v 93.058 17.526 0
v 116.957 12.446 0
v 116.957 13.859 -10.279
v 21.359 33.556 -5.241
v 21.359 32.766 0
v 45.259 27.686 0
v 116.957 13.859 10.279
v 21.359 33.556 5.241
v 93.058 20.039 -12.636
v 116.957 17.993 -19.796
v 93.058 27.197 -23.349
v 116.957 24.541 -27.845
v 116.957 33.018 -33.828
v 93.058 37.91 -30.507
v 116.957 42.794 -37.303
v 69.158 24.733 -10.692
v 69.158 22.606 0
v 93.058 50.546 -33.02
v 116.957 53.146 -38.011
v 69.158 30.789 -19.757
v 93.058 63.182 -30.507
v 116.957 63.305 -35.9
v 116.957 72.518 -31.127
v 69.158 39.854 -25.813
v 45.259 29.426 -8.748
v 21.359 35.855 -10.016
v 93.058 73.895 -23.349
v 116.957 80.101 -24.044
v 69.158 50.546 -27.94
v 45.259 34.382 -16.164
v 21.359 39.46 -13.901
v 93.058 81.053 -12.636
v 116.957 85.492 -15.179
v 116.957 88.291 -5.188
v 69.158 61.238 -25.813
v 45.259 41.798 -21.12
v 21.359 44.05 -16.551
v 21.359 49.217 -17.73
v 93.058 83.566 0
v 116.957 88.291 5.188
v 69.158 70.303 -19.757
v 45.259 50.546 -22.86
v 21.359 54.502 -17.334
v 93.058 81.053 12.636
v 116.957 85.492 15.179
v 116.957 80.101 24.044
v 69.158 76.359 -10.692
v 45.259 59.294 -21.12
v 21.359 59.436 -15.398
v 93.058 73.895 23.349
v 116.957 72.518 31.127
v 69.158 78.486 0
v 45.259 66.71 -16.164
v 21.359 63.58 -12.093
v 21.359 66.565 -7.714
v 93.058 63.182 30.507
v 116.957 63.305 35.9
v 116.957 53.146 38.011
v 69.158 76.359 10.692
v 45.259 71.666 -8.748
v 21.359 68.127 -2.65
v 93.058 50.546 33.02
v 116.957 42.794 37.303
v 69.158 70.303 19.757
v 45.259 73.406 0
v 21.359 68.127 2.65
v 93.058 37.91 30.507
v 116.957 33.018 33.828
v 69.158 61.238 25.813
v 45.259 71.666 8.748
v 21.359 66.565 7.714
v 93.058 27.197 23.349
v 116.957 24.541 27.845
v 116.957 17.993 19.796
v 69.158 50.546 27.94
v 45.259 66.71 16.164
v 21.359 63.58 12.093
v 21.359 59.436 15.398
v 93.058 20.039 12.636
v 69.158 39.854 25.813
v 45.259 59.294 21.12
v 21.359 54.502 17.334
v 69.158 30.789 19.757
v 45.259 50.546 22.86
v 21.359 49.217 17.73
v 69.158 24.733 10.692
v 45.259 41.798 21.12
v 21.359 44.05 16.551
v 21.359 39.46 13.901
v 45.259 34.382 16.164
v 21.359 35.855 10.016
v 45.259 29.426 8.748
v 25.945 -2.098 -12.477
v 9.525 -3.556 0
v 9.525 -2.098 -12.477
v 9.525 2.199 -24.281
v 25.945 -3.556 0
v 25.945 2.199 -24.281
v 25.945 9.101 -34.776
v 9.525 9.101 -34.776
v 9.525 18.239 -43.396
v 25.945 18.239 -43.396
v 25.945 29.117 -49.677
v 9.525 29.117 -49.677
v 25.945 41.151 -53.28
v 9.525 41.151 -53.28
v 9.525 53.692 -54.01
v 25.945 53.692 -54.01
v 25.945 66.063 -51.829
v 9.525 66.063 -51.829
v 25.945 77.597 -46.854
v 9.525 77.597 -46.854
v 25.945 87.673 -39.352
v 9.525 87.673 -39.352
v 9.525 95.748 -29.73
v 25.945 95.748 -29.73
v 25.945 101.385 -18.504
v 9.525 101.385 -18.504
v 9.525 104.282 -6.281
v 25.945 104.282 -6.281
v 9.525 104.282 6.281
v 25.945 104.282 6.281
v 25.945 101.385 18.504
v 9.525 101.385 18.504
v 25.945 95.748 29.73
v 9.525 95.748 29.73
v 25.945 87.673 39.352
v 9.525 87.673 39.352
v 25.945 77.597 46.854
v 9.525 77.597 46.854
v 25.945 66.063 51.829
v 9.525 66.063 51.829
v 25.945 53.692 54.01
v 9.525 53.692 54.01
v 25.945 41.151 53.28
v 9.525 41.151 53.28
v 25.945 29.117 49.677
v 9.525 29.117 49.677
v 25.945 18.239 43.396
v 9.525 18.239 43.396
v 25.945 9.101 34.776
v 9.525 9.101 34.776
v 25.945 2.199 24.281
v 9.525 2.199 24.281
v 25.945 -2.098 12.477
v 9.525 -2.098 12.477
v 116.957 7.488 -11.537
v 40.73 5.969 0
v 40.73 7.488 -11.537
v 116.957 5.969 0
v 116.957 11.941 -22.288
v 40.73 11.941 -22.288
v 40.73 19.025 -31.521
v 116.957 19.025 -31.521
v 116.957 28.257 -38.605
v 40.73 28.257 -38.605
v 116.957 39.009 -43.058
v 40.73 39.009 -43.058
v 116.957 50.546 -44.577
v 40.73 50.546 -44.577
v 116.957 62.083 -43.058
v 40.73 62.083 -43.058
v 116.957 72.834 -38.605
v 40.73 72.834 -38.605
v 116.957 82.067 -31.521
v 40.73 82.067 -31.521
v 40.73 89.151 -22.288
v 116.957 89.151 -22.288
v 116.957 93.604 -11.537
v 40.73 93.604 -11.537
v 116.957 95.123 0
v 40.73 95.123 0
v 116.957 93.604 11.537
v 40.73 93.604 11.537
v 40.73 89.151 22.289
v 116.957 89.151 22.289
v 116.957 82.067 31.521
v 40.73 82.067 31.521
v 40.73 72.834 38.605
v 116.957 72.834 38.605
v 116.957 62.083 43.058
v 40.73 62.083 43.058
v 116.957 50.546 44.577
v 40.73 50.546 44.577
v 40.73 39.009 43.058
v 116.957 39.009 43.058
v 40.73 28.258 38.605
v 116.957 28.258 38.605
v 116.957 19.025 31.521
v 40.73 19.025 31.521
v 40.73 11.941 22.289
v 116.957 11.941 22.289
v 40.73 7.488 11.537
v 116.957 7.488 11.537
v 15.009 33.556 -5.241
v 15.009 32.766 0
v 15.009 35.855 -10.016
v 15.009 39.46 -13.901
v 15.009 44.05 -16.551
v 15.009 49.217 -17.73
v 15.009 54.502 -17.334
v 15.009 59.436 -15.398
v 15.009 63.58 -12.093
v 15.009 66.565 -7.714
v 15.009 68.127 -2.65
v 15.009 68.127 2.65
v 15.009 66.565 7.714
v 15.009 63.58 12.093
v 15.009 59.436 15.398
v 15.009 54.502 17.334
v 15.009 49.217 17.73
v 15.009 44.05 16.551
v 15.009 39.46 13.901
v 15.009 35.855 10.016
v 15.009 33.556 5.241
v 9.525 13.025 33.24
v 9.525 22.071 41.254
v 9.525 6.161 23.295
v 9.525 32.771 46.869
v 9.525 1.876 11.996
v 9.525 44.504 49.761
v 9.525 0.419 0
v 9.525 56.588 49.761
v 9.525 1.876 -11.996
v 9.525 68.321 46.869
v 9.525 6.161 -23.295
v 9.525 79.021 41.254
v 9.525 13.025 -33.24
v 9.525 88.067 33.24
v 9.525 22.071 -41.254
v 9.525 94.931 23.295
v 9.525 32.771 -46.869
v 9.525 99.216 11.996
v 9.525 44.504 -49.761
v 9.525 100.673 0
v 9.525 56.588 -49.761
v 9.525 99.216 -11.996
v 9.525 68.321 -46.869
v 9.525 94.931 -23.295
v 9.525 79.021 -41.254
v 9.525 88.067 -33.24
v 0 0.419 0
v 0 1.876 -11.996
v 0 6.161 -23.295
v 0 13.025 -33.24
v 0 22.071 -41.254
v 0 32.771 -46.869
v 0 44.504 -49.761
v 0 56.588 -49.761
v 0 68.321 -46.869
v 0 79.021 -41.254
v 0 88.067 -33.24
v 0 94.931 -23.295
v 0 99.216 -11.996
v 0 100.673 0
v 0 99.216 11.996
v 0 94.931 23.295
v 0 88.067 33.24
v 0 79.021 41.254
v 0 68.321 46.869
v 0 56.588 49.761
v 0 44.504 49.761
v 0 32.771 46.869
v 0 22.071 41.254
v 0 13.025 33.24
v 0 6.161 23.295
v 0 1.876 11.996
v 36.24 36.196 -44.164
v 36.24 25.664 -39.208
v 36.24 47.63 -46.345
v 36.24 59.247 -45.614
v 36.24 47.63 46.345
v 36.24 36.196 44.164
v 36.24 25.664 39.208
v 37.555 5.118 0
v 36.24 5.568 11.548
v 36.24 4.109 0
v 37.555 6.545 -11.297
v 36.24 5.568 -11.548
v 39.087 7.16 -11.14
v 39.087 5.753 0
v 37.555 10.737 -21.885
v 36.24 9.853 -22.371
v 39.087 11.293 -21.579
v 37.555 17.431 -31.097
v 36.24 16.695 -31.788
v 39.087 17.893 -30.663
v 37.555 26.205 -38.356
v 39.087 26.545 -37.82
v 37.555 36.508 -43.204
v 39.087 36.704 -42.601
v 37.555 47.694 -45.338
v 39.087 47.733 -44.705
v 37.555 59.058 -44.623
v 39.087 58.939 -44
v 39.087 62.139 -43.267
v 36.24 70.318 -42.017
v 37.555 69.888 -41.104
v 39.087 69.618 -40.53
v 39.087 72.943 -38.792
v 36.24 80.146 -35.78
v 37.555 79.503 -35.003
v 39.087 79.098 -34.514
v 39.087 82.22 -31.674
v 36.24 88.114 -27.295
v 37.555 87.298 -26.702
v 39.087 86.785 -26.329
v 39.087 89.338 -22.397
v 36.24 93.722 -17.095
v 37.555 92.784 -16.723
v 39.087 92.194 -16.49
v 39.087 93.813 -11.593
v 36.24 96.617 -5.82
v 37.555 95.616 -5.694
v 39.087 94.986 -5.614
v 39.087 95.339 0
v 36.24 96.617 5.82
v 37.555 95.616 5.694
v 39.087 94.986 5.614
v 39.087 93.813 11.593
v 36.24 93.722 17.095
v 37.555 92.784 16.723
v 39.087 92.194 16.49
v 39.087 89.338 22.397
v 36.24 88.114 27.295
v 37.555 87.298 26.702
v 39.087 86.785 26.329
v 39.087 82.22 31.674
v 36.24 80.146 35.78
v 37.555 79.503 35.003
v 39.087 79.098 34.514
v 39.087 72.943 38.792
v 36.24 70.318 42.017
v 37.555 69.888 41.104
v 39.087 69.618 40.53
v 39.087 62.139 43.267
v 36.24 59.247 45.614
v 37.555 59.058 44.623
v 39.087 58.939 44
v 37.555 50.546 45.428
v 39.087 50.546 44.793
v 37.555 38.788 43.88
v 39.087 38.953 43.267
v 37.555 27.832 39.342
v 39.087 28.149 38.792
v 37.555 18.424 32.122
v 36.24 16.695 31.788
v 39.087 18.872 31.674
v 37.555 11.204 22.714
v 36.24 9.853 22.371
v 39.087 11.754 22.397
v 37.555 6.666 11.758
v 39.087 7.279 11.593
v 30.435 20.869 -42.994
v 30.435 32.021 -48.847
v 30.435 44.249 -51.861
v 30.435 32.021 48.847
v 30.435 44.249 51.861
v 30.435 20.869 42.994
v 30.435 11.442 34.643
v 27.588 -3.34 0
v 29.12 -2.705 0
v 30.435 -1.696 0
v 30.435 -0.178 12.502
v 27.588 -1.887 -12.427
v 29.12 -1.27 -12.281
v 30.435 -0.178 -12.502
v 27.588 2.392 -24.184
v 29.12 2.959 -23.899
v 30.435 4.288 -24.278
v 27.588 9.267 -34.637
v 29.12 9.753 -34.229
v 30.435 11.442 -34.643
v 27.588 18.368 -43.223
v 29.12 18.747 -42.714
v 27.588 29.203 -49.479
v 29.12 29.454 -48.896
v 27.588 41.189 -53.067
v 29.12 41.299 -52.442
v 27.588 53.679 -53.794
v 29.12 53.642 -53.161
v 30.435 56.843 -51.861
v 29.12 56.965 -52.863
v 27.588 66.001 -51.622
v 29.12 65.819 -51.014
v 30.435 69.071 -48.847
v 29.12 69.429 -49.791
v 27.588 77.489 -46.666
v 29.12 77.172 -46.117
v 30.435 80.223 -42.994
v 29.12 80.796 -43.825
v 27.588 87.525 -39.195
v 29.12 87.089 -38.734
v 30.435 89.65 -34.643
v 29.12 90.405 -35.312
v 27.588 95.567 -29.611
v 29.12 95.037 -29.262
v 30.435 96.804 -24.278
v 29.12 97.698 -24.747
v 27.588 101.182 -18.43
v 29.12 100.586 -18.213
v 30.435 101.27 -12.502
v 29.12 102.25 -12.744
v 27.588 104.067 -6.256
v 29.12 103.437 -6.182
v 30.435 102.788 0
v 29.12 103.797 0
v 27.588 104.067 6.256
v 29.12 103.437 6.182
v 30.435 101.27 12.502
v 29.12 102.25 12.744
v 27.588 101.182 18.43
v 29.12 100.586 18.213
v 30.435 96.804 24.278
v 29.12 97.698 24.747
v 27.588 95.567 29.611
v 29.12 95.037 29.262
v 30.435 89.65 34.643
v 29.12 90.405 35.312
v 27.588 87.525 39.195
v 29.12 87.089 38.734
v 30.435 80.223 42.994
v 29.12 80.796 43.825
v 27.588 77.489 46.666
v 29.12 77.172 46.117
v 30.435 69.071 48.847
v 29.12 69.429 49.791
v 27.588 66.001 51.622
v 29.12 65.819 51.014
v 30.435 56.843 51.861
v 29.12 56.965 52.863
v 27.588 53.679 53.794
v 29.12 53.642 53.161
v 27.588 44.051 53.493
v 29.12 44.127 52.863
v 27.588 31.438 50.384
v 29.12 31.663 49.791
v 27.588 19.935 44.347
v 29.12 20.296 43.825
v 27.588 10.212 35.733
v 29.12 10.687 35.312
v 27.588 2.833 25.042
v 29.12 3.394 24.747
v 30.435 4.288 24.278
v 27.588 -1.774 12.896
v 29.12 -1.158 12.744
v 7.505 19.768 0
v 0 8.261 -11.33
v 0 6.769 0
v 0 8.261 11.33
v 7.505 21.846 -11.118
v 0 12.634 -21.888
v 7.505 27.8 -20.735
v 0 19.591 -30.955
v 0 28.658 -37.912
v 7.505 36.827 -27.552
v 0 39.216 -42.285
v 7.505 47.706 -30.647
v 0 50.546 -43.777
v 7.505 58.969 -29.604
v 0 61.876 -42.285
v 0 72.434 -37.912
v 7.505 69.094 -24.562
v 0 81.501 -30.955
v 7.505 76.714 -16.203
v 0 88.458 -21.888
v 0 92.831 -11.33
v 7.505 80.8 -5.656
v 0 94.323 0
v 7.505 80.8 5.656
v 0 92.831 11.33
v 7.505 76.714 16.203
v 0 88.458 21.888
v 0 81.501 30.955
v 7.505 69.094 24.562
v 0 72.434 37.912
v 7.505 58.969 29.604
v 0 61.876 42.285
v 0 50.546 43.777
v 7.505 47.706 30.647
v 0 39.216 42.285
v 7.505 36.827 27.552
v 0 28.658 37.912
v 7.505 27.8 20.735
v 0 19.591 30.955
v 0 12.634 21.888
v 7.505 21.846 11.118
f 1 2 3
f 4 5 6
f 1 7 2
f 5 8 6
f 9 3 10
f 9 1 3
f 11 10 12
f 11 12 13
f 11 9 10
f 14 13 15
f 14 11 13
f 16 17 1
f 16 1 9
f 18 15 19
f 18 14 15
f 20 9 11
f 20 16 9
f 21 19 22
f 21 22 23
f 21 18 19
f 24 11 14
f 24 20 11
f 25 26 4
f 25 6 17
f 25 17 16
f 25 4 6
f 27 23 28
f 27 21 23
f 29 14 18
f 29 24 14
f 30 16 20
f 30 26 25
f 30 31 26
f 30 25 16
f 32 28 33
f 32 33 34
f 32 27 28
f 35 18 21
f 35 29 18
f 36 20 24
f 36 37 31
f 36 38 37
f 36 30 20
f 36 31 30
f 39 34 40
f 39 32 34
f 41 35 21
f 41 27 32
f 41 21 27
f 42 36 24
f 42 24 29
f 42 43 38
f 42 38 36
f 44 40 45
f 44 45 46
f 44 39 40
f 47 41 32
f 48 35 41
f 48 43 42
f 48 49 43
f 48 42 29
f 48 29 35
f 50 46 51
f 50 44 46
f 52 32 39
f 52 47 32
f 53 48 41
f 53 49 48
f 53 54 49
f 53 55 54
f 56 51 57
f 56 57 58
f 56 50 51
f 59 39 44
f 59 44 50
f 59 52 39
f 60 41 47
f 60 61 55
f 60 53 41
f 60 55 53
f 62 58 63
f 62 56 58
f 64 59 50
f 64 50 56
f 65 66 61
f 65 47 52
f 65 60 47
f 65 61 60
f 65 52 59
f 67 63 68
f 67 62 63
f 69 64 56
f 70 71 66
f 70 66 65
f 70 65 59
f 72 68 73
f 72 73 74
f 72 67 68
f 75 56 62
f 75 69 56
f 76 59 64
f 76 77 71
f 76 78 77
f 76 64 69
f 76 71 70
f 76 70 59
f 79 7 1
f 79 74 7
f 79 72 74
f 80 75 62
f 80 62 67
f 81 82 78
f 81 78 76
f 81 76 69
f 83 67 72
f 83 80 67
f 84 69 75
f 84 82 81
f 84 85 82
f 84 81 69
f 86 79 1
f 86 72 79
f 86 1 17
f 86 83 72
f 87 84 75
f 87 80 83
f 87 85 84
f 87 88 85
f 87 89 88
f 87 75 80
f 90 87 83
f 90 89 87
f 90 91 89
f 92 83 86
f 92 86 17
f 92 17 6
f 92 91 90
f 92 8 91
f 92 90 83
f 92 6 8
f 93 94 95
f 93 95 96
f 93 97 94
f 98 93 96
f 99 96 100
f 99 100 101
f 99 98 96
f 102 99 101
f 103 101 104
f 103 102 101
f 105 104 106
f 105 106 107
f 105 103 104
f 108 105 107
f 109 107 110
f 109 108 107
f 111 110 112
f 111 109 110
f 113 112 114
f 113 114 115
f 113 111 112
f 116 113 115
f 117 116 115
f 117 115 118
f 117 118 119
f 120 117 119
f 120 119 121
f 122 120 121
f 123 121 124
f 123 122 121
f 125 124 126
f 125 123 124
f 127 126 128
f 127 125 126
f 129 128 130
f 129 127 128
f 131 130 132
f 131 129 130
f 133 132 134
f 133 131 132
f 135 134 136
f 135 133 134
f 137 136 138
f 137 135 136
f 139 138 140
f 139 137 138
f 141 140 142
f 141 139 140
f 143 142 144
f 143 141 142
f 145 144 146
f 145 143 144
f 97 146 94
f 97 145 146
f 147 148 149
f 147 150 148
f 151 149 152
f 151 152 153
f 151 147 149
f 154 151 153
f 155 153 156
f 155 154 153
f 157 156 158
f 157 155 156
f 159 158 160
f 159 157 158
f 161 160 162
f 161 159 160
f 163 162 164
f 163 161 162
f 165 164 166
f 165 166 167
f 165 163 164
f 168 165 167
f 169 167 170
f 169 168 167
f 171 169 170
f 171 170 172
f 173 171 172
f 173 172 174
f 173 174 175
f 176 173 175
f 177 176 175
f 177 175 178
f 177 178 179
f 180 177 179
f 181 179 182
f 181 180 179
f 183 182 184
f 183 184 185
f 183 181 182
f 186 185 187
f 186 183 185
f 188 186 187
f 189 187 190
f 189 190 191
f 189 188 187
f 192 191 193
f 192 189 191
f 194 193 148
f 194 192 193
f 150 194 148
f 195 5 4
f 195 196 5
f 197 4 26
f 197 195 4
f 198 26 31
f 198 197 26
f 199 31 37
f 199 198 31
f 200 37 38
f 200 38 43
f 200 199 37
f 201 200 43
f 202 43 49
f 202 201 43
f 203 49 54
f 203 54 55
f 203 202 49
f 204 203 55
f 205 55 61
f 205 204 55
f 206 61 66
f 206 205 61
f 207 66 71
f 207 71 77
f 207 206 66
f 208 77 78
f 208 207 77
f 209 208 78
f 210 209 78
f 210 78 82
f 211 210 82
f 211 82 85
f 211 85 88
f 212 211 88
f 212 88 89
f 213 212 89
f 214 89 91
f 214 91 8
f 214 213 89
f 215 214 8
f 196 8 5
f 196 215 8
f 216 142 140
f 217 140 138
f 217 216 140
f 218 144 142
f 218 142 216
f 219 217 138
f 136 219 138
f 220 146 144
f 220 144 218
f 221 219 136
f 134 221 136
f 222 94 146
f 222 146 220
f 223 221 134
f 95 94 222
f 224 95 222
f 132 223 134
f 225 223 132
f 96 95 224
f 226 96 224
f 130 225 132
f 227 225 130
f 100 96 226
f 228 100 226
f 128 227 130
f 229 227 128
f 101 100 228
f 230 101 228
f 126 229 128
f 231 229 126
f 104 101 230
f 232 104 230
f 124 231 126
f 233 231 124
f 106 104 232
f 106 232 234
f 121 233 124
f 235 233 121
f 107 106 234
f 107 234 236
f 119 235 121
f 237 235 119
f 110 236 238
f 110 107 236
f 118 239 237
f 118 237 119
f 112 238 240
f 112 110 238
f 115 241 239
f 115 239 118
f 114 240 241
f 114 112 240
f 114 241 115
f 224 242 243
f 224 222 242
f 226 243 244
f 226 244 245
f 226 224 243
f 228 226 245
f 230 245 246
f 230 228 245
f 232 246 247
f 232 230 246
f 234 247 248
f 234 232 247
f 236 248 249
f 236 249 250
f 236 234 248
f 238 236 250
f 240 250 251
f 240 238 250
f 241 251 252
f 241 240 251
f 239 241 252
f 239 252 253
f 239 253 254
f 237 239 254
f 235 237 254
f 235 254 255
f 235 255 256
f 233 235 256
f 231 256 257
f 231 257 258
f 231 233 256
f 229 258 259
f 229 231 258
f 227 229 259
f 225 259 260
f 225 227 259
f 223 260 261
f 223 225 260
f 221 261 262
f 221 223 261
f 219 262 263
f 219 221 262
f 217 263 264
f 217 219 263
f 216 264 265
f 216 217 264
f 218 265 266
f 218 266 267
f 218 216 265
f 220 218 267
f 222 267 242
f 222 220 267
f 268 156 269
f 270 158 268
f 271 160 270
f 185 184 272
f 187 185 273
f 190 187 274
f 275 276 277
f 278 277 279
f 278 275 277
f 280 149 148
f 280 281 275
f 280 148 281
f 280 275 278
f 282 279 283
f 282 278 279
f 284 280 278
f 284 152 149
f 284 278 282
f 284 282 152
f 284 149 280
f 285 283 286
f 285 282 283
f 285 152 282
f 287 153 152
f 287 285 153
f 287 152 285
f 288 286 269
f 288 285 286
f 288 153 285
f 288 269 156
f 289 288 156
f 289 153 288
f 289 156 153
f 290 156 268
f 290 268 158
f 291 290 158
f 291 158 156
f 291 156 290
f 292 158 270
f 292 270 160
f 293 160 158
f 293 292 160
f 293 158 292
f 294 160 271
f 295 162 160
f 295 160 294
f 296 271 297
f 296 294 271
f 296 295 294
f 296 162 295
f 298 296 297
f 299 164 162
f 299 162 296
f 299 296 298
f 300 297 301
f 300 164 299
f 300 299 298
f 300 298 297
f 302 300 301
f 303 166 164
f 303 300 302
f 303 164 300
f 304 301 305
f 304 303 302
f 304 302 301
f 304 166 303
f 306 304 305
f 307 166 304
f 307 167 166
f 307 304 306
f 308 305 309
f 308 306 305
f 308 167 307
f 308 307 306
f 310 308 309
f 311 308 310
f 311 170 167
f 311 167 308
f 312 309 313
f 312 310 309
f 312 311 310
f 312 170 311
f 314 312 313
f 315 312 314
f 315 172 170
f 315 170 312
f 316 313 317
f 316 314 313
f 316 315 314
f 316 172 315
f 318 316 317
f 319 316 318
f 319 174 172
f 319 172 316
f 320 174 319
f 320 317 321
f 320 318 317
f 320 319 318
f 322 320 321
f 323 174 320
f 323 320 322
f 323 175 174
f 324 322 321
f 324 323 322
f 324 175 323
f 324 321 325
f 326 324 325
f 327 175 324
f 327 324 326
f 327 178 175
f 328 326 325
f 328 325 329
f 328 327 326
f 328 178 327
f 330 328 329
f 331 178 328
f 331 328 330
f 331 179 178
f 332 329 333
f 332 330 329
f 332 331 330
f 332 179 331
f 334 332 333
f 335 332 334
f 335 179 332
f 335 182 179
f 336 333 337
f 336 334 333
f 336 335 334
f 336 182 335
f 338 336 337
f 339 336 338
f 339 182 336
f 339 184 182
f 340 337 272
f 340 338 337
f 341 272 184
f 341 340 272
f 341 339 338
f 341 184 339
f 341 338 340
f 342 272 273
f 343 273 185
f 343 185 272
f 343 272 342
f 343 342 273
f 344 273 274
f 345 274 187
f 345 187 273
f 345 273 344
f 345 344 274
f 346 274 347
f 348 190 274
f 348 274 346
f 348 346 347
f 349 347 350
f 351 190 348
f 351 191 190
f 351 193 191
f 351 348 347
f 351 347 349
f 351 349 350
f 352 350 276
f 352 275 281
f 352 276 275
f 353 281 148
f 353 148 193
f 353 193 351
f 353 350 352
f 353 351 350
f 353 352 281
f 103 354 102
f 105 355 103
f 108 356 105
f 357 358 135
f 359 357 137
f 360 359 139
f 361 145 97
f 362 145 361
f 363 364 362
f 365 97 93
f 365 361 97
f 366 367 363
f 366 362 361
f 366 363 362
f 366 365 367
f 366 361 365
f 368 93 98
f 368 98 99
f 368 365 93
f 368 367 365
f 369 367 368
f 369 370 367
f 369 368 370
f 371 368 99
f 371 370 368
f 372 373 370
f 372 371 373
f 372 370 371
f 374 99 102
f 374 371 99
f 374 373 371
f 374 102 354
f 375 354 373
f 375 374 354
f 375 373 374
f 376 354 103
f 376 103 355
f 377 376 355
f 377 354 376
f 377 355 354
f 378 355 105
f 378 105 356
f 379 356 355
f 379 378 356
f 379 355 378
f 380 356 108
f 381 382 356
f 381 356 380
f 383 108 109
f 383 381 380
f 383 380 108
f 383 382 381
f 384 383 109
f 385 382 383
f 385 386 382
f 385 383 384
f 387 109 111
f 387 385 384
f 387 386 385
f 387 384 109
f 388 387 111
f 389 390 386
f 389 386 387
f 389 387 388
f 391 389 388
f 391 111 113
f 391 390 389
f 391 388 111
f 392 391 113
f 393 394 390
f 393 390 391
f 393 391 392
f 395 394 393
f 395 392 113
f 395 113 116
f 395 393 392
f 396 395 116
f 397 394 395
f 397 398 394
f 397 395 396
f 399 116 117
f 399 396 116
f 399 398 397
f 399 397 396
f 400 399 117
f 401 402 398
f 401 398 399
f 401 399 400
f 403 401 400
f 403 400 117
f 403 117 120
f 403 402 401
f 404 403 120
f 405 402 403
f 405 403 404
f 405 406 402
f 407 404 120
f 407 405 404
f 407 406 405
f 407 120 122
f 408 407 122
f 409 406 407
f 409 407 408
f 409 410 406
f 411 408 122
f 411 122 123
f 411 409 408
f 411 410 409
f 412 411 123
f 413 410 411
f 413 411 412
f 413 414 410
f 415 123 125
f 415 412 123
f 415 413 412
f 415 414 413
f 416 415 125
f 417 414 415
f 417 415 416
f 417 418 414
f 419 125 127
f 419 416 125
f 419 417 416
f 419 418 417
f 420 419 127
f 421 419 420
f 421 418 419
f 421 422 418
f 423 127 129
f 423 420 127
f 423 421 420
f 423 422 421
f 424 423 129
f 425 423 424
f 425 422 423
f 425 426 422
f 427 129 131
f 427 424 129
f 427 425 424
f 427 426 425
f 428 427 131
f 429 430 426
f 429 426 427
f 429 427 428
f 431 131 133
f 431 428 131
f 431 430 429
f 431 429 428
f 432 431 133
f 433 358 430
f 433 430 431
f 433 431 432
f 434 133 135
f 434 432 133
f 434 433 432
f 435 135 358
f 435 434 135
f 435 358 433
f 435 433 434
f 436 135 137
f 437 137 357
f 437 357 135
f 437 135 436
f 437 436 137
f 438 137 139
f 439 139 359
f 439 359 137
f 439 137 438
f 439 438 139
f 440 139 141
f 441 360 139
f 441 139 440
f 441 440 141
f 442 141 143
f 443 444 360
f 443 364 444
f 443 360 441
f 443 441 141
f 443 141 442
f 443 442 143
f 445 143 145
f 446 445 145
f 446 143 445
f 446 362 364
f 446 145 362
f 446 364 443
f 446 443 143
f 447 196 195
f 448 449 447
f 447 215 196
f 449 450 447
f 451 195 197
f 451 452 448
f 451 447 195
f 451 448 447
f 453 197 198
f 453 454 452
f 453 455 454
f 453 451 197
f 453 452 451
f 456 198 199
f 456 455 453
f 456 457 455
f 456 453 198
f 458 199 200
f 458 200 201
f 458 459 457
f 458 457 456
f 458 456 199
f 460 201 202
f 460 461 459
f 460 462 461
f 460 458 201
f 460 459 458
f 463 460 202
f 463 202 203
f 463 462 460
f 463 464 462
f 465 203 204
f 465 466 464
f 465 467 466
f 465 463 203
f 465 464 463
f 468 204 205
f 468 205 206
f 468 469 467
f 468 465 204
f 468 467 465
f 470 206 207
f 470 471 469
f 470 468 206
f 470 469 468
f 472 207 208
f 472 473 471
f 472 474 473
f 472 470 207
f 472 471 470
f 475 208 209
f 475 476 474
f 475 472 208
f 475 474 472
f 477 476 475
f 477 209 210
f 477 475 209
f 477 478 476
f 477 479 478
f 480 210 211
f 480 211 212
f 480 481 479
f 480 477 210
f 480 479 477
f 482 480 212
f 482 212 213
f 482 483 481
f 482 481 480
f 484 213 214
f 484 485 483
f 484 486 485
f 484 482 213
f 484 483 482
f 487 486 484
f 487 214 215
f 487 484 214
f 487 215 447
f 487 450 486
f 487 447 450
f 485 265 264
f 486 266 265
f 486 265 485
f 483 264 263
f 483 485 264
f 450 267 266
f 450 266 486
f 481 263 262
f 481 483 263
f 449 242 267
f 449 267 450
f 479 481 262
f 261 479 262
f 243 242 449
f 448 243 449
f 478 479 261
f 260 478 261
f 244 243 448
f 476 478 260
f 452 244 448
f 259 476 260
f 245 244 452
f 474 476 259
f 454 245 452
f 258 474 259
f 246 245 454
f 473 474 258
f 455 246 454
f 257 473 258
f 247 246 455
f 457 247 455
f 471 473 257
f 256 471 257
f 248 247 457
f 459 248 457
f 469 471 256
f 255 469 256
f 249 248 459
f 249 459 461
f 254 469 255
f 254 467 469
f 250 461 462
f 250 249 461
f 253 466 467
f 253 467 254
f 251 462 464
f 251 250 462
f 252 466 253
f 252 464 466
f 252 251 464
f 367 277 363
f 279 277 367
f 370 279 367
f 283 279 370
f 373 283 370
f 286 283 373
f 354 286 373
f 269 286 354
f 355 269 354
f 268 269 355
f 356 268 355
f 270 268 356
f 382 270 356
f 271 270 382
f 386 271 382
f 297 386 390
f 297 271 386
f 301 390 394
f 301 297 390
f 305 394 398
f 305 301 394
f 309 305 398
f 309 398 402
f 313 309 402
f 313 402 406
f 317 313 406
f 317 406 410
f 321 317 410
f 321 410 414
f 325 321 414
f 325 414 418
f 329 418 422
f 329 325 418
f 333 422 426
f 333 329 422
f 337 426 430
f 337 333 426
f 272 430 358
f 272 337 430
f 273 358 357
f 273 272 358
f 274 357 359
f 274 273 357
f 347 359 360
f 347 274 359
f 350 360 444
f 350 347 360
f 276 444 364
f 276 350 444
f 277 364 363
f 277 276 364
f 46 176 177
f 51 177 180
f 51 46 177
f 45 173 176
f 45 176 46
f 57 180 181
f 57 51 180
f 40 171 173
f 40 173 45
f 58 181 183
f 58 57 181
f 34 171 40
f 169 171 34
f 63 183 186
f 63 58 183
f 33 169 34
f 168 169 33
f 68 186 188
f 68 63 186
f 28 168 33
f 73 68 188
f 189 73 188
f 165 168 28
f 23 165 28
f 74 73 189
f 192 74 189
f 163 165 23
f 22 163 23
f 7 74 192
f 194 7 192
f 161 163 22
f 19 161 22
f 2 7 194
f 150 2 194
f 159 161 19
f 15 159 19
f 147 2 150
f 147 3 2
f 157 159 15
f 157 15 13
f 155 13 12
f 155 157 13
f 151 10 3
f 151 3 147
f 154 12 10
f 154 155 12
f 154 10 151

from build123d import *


with BuildPart() as part:
    # Sketch1 → Revolve1 (revolve)
    with BuildSketch(Plane.XY):
        with BuildLine():
            Line((116.957401038, 12.446), (21.359317213, 32.766))
            Line((21.359317213, 32.766), (15.009317213, 32.766))
            Line((15.009317213, 32.766), (0, 6.7691))
            Line((0, 6.7691), (0, 0.4191))
            Line((0, 0.4191), (9.525, 0.4191))
            Line((9.525, 0.4191), (9.525, -3.556))
            Line((9.525, -3.556), (25.944743879, -3.556))
            ThreePointArc((25.944743879, -3.556), (28.374783674, -3.072635031), (30.434871939, -1.696128061))
            Line((30.434871939, -1.696128061), (36.240128061, 4.109128061))
            ThreePointArc((36.240128061, 4.109128061), (38.300216326, 5.485635031), (40.730256121, 5.969))
            Line((40.730256121, 5.969), (116.957401038, 5.969))
            Line((116.957401038, 5.969), (116.957401038, 12.446))
        make_face()
    revolve(axis=Axis((0, 50.546, 0), (1, 0, 0)))


solid = part.part
